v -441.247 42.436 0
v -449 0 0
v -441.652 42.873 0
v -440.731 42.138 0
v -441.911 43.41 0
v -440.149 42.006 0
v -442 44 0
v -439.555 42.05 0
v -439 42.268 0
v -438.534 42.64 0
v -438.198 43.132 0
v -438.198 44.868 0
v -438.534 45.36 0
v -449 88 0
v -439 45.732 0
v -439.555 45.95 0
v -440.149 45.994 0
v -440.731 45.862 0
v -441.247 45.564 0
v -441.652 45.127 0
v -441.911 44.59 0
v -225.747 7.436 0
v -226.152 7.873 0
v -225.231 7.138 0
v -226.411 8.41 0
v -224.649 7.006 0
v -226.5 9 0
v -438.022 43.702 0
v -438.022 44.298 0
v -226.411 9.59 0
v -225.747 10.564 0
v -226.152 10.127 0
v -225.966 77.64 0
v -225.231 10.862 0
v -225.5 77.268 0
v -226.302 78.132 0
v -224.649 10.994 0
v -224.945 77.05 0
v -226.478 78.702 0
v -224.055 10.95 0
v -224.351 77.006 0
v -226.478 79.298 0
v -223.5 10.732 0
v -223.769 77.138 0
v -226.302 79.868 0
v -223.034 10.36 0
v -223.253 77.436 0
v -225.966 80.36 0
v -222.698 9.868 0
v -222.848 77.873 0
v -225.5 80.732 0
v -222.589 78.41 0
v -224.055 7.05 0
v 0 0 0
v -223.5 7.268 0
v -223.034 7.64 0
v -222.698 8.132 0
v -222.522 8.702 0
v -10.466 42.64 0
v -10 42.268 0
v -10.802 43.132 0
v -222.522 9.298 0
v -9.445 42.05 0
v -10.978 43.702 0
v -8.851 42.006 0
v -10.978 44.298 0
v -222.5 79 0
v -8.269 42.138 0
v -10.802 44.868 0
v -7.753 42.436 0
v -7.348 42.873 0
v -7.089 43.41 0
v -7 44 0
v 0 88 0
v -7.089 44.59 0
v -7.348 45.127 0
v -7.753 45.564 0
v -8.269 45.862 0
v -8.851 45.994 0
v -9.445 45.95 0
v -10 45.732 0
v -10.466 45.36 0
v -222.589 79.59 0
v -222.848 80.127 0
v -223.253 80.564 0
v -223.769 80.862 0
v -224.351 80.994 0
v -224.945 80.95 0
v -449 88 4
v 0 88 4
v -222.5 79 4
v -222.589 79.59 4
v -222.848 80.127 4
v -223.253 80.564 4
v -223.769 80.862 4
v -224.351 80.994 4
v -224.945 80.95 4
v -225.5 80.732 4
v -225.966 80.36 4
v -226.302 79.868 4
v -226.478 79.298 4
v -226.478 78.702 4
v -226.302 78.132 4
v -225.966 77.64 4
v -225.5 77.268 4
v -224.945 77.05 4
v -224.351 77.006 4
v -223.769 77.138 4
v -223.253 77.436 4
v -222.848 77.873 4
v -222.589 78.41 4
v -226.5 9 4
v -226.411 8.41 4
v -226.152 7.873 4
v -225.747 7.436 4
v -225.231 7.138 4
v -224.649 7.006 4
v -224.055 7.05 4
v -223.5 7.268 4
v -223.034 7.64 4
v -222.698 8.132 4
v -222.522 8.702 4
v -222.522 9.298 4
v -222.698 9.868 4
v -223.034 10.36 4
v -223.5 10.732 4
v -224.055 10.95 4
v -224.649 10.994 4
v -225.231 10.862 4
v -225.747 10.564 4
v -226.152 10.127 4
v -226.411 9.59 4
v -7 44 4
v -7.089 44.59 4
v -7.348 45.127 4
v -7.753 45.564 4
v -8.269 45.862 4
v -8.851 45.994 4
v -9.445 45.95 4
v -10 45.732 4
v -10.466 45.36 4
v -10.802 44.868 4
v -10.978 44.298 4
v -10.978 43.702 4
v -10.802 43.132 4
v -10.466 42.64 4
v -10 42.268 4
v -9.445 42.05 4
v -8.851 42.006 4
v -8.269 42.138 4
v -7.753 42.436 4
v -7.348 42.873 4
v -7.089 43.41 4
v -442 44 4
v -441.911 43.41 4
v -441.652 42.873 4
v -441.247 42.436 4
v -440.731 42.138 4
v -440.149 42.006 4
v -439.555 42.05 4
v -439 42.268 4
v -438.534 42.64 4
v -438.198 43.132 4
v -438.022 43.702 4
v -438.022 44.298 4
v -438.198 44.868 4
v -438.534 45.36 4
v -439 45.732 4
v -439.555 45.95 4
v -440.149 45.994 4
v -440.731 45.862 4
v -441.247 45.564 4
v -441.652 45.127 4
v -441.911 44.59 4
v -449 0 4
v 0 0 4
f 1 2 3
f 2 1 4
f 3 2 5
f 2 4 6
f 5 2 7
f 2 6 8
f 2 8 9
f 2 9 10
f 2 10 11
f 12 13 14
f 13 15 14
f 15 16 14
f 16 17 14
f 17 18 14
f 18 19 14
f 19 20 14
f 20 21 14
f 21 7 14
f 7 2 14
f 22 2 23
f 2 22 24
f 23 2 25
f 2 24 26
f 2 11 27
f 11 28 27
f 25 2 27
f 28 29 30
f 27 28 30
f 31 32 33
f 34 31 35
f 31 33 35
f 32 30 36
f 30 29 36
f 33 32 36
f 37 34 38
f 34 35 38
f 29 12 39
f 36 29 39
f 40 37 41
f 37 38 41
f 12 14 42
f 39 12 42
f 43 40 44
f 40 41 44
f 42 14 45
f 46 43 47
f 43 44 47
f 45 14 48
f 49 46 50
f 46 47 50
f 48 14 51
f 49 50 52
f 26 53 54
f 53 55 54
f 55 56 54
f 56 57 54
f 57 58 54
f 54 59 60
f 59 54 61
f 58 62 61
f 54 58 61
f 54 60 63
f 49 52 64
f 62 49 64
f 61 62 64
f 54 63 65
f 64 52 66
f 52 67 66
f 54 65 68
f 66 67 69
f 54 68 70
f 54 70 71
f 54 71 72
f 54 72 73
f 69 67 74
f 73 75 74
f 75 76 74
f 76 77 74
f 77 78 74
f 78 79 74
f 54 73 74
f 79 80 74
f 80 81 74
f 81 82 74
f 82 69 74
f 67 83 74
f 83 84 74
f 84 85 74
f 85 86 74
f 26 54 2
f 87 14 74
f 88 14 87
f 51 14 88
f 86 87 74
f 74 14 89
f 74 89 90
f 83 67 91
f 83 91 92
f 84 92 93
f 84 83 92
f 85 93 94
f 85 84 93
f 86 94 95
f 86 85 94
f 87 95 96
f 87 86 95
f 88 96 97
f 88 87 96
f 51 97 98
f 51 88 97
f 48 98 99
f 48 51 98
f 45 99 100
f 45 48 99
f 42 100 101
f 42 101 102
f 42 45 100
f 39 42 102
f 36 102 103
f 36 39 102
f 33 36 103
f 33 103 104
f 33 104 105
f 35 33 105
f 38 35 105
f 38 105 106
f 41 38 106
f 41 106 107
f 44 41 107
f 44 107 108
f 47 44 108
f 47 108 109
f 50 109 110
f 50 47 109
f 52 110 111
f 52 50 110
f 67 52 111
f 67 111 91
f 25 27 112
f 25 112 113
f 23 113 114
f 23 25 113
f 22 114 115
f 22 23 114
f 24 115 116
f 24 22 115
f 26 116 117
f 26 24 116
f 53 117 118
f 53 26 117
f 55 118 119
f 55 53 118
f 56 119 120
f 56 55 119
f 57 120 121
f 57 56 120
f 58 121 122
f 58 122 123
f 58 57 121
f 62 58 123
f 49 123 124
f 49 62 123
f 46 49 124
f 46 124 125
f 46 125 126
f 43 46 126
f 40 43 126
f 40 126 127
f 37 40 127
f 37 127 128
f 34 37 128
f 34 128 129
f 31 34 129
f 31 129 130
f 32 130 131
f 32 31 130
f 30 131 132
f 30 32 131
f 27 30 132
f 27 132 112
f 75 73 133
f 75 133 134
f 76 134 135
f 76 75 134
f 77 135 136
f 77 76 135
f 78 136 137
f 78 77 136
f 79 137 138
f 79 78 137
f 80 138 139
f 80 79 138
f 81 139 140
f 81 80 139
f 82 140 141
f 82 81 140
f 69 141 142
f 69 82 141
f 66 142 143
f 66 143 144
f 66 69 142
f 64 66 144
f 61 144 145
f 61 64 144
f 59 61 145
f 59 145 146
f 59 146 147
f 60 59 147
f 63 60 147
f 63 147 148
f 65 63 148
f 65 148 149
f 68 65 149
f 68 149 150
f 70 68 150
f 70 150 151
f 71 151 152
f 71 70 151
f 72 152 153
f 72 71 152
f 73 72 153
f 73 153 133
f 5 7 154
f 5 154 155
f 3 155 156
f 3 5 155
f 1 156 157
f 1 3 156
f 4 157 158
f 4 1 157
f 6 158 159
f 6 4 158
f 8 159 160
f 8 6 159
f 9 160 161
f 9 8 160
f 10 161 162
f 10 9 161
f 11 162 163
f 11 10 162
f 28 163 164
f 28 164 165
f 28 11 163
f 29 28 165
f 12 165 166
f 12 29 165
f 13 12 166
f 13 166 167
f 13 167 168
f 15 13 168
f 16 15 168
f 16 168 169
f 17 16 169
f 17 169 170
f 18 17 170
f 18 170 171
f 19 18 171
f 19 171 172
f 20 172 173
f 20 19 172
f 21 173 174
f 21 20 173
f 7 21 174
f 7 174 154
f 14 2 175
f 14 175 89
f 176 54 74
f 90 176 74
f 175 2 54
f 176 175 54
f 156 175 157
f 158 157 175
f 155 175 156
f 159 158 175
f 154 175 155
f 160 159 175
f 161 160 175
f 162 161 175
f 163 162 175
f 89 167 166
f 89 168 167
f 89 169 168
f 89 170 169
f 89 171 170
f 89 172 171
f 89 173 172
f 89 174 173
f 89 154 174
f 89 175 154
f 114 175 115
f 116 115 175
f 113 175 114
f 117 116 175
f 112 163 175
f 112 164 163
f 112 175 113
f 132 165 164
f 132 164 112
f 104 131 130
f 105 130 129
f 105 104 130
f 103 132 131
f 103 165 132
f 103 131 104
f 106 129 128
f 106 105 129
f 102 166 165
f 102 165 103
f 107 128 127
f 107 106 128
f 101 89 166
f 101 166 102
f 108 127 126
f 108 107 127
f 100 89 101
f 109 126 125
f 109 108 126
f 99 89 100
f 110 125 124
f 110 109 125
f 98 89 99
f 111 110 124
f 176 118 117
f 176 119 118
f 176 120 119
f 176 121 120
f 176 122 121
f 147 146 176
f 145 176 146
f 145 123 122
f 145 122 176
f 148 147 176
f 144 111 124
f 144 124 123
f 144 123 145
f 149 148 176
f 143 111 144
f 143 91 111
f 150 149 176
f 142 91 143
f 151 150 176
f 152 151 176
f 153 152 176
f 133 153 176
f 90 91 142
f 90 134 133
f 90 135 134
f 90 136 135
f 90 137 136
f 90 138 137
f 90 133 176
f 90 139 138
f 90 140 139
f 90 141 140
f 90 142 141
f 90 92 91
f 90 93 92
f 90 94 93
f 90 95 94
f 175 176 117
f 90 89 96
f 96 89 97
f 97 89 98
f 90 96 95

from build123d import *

# Parameters (mm, degrees)
SCHIZZO1_W                   = 449
SCHIZZO1_H                   = 88
SCHIZZO1_R                   = 2
ESTRUSIONE_ESTRUSIONE1_DEPTH = 4


with BuildPart() as part:
    # Schizzo1 → Estrusione-Estrusione1 (new body)
    with BuildSketch(Plane.XY):
        with Locations((-224.5, 44)):
            Rectangle(SCHIZZO1_W, SCHIZZO1_H)
        with Locations((-9, 44)):
            Circle(SCHIZZO1_R, mode=Mode.SUBTRACT)
        with Locations((-224.5, 79)):
            Circle(SCHIZZO1_R, mode=Mode.SUBTRACT)
        with Locations(Location((-440, 44, 0), (0, 0, 180))):
            Circle(SCHIZZO1_R, mode=Mode.SUBTRACT)
        with Locations(Location((-224.5, 9, 0), (0, 0, 180))):
            Circle(SCHIZZO1_R, mode=Mode.SUBTRACT)
    extrude(amount=ESTRUSIONE_ESTRUSIONE1_DEPTH)


solid = part.part
